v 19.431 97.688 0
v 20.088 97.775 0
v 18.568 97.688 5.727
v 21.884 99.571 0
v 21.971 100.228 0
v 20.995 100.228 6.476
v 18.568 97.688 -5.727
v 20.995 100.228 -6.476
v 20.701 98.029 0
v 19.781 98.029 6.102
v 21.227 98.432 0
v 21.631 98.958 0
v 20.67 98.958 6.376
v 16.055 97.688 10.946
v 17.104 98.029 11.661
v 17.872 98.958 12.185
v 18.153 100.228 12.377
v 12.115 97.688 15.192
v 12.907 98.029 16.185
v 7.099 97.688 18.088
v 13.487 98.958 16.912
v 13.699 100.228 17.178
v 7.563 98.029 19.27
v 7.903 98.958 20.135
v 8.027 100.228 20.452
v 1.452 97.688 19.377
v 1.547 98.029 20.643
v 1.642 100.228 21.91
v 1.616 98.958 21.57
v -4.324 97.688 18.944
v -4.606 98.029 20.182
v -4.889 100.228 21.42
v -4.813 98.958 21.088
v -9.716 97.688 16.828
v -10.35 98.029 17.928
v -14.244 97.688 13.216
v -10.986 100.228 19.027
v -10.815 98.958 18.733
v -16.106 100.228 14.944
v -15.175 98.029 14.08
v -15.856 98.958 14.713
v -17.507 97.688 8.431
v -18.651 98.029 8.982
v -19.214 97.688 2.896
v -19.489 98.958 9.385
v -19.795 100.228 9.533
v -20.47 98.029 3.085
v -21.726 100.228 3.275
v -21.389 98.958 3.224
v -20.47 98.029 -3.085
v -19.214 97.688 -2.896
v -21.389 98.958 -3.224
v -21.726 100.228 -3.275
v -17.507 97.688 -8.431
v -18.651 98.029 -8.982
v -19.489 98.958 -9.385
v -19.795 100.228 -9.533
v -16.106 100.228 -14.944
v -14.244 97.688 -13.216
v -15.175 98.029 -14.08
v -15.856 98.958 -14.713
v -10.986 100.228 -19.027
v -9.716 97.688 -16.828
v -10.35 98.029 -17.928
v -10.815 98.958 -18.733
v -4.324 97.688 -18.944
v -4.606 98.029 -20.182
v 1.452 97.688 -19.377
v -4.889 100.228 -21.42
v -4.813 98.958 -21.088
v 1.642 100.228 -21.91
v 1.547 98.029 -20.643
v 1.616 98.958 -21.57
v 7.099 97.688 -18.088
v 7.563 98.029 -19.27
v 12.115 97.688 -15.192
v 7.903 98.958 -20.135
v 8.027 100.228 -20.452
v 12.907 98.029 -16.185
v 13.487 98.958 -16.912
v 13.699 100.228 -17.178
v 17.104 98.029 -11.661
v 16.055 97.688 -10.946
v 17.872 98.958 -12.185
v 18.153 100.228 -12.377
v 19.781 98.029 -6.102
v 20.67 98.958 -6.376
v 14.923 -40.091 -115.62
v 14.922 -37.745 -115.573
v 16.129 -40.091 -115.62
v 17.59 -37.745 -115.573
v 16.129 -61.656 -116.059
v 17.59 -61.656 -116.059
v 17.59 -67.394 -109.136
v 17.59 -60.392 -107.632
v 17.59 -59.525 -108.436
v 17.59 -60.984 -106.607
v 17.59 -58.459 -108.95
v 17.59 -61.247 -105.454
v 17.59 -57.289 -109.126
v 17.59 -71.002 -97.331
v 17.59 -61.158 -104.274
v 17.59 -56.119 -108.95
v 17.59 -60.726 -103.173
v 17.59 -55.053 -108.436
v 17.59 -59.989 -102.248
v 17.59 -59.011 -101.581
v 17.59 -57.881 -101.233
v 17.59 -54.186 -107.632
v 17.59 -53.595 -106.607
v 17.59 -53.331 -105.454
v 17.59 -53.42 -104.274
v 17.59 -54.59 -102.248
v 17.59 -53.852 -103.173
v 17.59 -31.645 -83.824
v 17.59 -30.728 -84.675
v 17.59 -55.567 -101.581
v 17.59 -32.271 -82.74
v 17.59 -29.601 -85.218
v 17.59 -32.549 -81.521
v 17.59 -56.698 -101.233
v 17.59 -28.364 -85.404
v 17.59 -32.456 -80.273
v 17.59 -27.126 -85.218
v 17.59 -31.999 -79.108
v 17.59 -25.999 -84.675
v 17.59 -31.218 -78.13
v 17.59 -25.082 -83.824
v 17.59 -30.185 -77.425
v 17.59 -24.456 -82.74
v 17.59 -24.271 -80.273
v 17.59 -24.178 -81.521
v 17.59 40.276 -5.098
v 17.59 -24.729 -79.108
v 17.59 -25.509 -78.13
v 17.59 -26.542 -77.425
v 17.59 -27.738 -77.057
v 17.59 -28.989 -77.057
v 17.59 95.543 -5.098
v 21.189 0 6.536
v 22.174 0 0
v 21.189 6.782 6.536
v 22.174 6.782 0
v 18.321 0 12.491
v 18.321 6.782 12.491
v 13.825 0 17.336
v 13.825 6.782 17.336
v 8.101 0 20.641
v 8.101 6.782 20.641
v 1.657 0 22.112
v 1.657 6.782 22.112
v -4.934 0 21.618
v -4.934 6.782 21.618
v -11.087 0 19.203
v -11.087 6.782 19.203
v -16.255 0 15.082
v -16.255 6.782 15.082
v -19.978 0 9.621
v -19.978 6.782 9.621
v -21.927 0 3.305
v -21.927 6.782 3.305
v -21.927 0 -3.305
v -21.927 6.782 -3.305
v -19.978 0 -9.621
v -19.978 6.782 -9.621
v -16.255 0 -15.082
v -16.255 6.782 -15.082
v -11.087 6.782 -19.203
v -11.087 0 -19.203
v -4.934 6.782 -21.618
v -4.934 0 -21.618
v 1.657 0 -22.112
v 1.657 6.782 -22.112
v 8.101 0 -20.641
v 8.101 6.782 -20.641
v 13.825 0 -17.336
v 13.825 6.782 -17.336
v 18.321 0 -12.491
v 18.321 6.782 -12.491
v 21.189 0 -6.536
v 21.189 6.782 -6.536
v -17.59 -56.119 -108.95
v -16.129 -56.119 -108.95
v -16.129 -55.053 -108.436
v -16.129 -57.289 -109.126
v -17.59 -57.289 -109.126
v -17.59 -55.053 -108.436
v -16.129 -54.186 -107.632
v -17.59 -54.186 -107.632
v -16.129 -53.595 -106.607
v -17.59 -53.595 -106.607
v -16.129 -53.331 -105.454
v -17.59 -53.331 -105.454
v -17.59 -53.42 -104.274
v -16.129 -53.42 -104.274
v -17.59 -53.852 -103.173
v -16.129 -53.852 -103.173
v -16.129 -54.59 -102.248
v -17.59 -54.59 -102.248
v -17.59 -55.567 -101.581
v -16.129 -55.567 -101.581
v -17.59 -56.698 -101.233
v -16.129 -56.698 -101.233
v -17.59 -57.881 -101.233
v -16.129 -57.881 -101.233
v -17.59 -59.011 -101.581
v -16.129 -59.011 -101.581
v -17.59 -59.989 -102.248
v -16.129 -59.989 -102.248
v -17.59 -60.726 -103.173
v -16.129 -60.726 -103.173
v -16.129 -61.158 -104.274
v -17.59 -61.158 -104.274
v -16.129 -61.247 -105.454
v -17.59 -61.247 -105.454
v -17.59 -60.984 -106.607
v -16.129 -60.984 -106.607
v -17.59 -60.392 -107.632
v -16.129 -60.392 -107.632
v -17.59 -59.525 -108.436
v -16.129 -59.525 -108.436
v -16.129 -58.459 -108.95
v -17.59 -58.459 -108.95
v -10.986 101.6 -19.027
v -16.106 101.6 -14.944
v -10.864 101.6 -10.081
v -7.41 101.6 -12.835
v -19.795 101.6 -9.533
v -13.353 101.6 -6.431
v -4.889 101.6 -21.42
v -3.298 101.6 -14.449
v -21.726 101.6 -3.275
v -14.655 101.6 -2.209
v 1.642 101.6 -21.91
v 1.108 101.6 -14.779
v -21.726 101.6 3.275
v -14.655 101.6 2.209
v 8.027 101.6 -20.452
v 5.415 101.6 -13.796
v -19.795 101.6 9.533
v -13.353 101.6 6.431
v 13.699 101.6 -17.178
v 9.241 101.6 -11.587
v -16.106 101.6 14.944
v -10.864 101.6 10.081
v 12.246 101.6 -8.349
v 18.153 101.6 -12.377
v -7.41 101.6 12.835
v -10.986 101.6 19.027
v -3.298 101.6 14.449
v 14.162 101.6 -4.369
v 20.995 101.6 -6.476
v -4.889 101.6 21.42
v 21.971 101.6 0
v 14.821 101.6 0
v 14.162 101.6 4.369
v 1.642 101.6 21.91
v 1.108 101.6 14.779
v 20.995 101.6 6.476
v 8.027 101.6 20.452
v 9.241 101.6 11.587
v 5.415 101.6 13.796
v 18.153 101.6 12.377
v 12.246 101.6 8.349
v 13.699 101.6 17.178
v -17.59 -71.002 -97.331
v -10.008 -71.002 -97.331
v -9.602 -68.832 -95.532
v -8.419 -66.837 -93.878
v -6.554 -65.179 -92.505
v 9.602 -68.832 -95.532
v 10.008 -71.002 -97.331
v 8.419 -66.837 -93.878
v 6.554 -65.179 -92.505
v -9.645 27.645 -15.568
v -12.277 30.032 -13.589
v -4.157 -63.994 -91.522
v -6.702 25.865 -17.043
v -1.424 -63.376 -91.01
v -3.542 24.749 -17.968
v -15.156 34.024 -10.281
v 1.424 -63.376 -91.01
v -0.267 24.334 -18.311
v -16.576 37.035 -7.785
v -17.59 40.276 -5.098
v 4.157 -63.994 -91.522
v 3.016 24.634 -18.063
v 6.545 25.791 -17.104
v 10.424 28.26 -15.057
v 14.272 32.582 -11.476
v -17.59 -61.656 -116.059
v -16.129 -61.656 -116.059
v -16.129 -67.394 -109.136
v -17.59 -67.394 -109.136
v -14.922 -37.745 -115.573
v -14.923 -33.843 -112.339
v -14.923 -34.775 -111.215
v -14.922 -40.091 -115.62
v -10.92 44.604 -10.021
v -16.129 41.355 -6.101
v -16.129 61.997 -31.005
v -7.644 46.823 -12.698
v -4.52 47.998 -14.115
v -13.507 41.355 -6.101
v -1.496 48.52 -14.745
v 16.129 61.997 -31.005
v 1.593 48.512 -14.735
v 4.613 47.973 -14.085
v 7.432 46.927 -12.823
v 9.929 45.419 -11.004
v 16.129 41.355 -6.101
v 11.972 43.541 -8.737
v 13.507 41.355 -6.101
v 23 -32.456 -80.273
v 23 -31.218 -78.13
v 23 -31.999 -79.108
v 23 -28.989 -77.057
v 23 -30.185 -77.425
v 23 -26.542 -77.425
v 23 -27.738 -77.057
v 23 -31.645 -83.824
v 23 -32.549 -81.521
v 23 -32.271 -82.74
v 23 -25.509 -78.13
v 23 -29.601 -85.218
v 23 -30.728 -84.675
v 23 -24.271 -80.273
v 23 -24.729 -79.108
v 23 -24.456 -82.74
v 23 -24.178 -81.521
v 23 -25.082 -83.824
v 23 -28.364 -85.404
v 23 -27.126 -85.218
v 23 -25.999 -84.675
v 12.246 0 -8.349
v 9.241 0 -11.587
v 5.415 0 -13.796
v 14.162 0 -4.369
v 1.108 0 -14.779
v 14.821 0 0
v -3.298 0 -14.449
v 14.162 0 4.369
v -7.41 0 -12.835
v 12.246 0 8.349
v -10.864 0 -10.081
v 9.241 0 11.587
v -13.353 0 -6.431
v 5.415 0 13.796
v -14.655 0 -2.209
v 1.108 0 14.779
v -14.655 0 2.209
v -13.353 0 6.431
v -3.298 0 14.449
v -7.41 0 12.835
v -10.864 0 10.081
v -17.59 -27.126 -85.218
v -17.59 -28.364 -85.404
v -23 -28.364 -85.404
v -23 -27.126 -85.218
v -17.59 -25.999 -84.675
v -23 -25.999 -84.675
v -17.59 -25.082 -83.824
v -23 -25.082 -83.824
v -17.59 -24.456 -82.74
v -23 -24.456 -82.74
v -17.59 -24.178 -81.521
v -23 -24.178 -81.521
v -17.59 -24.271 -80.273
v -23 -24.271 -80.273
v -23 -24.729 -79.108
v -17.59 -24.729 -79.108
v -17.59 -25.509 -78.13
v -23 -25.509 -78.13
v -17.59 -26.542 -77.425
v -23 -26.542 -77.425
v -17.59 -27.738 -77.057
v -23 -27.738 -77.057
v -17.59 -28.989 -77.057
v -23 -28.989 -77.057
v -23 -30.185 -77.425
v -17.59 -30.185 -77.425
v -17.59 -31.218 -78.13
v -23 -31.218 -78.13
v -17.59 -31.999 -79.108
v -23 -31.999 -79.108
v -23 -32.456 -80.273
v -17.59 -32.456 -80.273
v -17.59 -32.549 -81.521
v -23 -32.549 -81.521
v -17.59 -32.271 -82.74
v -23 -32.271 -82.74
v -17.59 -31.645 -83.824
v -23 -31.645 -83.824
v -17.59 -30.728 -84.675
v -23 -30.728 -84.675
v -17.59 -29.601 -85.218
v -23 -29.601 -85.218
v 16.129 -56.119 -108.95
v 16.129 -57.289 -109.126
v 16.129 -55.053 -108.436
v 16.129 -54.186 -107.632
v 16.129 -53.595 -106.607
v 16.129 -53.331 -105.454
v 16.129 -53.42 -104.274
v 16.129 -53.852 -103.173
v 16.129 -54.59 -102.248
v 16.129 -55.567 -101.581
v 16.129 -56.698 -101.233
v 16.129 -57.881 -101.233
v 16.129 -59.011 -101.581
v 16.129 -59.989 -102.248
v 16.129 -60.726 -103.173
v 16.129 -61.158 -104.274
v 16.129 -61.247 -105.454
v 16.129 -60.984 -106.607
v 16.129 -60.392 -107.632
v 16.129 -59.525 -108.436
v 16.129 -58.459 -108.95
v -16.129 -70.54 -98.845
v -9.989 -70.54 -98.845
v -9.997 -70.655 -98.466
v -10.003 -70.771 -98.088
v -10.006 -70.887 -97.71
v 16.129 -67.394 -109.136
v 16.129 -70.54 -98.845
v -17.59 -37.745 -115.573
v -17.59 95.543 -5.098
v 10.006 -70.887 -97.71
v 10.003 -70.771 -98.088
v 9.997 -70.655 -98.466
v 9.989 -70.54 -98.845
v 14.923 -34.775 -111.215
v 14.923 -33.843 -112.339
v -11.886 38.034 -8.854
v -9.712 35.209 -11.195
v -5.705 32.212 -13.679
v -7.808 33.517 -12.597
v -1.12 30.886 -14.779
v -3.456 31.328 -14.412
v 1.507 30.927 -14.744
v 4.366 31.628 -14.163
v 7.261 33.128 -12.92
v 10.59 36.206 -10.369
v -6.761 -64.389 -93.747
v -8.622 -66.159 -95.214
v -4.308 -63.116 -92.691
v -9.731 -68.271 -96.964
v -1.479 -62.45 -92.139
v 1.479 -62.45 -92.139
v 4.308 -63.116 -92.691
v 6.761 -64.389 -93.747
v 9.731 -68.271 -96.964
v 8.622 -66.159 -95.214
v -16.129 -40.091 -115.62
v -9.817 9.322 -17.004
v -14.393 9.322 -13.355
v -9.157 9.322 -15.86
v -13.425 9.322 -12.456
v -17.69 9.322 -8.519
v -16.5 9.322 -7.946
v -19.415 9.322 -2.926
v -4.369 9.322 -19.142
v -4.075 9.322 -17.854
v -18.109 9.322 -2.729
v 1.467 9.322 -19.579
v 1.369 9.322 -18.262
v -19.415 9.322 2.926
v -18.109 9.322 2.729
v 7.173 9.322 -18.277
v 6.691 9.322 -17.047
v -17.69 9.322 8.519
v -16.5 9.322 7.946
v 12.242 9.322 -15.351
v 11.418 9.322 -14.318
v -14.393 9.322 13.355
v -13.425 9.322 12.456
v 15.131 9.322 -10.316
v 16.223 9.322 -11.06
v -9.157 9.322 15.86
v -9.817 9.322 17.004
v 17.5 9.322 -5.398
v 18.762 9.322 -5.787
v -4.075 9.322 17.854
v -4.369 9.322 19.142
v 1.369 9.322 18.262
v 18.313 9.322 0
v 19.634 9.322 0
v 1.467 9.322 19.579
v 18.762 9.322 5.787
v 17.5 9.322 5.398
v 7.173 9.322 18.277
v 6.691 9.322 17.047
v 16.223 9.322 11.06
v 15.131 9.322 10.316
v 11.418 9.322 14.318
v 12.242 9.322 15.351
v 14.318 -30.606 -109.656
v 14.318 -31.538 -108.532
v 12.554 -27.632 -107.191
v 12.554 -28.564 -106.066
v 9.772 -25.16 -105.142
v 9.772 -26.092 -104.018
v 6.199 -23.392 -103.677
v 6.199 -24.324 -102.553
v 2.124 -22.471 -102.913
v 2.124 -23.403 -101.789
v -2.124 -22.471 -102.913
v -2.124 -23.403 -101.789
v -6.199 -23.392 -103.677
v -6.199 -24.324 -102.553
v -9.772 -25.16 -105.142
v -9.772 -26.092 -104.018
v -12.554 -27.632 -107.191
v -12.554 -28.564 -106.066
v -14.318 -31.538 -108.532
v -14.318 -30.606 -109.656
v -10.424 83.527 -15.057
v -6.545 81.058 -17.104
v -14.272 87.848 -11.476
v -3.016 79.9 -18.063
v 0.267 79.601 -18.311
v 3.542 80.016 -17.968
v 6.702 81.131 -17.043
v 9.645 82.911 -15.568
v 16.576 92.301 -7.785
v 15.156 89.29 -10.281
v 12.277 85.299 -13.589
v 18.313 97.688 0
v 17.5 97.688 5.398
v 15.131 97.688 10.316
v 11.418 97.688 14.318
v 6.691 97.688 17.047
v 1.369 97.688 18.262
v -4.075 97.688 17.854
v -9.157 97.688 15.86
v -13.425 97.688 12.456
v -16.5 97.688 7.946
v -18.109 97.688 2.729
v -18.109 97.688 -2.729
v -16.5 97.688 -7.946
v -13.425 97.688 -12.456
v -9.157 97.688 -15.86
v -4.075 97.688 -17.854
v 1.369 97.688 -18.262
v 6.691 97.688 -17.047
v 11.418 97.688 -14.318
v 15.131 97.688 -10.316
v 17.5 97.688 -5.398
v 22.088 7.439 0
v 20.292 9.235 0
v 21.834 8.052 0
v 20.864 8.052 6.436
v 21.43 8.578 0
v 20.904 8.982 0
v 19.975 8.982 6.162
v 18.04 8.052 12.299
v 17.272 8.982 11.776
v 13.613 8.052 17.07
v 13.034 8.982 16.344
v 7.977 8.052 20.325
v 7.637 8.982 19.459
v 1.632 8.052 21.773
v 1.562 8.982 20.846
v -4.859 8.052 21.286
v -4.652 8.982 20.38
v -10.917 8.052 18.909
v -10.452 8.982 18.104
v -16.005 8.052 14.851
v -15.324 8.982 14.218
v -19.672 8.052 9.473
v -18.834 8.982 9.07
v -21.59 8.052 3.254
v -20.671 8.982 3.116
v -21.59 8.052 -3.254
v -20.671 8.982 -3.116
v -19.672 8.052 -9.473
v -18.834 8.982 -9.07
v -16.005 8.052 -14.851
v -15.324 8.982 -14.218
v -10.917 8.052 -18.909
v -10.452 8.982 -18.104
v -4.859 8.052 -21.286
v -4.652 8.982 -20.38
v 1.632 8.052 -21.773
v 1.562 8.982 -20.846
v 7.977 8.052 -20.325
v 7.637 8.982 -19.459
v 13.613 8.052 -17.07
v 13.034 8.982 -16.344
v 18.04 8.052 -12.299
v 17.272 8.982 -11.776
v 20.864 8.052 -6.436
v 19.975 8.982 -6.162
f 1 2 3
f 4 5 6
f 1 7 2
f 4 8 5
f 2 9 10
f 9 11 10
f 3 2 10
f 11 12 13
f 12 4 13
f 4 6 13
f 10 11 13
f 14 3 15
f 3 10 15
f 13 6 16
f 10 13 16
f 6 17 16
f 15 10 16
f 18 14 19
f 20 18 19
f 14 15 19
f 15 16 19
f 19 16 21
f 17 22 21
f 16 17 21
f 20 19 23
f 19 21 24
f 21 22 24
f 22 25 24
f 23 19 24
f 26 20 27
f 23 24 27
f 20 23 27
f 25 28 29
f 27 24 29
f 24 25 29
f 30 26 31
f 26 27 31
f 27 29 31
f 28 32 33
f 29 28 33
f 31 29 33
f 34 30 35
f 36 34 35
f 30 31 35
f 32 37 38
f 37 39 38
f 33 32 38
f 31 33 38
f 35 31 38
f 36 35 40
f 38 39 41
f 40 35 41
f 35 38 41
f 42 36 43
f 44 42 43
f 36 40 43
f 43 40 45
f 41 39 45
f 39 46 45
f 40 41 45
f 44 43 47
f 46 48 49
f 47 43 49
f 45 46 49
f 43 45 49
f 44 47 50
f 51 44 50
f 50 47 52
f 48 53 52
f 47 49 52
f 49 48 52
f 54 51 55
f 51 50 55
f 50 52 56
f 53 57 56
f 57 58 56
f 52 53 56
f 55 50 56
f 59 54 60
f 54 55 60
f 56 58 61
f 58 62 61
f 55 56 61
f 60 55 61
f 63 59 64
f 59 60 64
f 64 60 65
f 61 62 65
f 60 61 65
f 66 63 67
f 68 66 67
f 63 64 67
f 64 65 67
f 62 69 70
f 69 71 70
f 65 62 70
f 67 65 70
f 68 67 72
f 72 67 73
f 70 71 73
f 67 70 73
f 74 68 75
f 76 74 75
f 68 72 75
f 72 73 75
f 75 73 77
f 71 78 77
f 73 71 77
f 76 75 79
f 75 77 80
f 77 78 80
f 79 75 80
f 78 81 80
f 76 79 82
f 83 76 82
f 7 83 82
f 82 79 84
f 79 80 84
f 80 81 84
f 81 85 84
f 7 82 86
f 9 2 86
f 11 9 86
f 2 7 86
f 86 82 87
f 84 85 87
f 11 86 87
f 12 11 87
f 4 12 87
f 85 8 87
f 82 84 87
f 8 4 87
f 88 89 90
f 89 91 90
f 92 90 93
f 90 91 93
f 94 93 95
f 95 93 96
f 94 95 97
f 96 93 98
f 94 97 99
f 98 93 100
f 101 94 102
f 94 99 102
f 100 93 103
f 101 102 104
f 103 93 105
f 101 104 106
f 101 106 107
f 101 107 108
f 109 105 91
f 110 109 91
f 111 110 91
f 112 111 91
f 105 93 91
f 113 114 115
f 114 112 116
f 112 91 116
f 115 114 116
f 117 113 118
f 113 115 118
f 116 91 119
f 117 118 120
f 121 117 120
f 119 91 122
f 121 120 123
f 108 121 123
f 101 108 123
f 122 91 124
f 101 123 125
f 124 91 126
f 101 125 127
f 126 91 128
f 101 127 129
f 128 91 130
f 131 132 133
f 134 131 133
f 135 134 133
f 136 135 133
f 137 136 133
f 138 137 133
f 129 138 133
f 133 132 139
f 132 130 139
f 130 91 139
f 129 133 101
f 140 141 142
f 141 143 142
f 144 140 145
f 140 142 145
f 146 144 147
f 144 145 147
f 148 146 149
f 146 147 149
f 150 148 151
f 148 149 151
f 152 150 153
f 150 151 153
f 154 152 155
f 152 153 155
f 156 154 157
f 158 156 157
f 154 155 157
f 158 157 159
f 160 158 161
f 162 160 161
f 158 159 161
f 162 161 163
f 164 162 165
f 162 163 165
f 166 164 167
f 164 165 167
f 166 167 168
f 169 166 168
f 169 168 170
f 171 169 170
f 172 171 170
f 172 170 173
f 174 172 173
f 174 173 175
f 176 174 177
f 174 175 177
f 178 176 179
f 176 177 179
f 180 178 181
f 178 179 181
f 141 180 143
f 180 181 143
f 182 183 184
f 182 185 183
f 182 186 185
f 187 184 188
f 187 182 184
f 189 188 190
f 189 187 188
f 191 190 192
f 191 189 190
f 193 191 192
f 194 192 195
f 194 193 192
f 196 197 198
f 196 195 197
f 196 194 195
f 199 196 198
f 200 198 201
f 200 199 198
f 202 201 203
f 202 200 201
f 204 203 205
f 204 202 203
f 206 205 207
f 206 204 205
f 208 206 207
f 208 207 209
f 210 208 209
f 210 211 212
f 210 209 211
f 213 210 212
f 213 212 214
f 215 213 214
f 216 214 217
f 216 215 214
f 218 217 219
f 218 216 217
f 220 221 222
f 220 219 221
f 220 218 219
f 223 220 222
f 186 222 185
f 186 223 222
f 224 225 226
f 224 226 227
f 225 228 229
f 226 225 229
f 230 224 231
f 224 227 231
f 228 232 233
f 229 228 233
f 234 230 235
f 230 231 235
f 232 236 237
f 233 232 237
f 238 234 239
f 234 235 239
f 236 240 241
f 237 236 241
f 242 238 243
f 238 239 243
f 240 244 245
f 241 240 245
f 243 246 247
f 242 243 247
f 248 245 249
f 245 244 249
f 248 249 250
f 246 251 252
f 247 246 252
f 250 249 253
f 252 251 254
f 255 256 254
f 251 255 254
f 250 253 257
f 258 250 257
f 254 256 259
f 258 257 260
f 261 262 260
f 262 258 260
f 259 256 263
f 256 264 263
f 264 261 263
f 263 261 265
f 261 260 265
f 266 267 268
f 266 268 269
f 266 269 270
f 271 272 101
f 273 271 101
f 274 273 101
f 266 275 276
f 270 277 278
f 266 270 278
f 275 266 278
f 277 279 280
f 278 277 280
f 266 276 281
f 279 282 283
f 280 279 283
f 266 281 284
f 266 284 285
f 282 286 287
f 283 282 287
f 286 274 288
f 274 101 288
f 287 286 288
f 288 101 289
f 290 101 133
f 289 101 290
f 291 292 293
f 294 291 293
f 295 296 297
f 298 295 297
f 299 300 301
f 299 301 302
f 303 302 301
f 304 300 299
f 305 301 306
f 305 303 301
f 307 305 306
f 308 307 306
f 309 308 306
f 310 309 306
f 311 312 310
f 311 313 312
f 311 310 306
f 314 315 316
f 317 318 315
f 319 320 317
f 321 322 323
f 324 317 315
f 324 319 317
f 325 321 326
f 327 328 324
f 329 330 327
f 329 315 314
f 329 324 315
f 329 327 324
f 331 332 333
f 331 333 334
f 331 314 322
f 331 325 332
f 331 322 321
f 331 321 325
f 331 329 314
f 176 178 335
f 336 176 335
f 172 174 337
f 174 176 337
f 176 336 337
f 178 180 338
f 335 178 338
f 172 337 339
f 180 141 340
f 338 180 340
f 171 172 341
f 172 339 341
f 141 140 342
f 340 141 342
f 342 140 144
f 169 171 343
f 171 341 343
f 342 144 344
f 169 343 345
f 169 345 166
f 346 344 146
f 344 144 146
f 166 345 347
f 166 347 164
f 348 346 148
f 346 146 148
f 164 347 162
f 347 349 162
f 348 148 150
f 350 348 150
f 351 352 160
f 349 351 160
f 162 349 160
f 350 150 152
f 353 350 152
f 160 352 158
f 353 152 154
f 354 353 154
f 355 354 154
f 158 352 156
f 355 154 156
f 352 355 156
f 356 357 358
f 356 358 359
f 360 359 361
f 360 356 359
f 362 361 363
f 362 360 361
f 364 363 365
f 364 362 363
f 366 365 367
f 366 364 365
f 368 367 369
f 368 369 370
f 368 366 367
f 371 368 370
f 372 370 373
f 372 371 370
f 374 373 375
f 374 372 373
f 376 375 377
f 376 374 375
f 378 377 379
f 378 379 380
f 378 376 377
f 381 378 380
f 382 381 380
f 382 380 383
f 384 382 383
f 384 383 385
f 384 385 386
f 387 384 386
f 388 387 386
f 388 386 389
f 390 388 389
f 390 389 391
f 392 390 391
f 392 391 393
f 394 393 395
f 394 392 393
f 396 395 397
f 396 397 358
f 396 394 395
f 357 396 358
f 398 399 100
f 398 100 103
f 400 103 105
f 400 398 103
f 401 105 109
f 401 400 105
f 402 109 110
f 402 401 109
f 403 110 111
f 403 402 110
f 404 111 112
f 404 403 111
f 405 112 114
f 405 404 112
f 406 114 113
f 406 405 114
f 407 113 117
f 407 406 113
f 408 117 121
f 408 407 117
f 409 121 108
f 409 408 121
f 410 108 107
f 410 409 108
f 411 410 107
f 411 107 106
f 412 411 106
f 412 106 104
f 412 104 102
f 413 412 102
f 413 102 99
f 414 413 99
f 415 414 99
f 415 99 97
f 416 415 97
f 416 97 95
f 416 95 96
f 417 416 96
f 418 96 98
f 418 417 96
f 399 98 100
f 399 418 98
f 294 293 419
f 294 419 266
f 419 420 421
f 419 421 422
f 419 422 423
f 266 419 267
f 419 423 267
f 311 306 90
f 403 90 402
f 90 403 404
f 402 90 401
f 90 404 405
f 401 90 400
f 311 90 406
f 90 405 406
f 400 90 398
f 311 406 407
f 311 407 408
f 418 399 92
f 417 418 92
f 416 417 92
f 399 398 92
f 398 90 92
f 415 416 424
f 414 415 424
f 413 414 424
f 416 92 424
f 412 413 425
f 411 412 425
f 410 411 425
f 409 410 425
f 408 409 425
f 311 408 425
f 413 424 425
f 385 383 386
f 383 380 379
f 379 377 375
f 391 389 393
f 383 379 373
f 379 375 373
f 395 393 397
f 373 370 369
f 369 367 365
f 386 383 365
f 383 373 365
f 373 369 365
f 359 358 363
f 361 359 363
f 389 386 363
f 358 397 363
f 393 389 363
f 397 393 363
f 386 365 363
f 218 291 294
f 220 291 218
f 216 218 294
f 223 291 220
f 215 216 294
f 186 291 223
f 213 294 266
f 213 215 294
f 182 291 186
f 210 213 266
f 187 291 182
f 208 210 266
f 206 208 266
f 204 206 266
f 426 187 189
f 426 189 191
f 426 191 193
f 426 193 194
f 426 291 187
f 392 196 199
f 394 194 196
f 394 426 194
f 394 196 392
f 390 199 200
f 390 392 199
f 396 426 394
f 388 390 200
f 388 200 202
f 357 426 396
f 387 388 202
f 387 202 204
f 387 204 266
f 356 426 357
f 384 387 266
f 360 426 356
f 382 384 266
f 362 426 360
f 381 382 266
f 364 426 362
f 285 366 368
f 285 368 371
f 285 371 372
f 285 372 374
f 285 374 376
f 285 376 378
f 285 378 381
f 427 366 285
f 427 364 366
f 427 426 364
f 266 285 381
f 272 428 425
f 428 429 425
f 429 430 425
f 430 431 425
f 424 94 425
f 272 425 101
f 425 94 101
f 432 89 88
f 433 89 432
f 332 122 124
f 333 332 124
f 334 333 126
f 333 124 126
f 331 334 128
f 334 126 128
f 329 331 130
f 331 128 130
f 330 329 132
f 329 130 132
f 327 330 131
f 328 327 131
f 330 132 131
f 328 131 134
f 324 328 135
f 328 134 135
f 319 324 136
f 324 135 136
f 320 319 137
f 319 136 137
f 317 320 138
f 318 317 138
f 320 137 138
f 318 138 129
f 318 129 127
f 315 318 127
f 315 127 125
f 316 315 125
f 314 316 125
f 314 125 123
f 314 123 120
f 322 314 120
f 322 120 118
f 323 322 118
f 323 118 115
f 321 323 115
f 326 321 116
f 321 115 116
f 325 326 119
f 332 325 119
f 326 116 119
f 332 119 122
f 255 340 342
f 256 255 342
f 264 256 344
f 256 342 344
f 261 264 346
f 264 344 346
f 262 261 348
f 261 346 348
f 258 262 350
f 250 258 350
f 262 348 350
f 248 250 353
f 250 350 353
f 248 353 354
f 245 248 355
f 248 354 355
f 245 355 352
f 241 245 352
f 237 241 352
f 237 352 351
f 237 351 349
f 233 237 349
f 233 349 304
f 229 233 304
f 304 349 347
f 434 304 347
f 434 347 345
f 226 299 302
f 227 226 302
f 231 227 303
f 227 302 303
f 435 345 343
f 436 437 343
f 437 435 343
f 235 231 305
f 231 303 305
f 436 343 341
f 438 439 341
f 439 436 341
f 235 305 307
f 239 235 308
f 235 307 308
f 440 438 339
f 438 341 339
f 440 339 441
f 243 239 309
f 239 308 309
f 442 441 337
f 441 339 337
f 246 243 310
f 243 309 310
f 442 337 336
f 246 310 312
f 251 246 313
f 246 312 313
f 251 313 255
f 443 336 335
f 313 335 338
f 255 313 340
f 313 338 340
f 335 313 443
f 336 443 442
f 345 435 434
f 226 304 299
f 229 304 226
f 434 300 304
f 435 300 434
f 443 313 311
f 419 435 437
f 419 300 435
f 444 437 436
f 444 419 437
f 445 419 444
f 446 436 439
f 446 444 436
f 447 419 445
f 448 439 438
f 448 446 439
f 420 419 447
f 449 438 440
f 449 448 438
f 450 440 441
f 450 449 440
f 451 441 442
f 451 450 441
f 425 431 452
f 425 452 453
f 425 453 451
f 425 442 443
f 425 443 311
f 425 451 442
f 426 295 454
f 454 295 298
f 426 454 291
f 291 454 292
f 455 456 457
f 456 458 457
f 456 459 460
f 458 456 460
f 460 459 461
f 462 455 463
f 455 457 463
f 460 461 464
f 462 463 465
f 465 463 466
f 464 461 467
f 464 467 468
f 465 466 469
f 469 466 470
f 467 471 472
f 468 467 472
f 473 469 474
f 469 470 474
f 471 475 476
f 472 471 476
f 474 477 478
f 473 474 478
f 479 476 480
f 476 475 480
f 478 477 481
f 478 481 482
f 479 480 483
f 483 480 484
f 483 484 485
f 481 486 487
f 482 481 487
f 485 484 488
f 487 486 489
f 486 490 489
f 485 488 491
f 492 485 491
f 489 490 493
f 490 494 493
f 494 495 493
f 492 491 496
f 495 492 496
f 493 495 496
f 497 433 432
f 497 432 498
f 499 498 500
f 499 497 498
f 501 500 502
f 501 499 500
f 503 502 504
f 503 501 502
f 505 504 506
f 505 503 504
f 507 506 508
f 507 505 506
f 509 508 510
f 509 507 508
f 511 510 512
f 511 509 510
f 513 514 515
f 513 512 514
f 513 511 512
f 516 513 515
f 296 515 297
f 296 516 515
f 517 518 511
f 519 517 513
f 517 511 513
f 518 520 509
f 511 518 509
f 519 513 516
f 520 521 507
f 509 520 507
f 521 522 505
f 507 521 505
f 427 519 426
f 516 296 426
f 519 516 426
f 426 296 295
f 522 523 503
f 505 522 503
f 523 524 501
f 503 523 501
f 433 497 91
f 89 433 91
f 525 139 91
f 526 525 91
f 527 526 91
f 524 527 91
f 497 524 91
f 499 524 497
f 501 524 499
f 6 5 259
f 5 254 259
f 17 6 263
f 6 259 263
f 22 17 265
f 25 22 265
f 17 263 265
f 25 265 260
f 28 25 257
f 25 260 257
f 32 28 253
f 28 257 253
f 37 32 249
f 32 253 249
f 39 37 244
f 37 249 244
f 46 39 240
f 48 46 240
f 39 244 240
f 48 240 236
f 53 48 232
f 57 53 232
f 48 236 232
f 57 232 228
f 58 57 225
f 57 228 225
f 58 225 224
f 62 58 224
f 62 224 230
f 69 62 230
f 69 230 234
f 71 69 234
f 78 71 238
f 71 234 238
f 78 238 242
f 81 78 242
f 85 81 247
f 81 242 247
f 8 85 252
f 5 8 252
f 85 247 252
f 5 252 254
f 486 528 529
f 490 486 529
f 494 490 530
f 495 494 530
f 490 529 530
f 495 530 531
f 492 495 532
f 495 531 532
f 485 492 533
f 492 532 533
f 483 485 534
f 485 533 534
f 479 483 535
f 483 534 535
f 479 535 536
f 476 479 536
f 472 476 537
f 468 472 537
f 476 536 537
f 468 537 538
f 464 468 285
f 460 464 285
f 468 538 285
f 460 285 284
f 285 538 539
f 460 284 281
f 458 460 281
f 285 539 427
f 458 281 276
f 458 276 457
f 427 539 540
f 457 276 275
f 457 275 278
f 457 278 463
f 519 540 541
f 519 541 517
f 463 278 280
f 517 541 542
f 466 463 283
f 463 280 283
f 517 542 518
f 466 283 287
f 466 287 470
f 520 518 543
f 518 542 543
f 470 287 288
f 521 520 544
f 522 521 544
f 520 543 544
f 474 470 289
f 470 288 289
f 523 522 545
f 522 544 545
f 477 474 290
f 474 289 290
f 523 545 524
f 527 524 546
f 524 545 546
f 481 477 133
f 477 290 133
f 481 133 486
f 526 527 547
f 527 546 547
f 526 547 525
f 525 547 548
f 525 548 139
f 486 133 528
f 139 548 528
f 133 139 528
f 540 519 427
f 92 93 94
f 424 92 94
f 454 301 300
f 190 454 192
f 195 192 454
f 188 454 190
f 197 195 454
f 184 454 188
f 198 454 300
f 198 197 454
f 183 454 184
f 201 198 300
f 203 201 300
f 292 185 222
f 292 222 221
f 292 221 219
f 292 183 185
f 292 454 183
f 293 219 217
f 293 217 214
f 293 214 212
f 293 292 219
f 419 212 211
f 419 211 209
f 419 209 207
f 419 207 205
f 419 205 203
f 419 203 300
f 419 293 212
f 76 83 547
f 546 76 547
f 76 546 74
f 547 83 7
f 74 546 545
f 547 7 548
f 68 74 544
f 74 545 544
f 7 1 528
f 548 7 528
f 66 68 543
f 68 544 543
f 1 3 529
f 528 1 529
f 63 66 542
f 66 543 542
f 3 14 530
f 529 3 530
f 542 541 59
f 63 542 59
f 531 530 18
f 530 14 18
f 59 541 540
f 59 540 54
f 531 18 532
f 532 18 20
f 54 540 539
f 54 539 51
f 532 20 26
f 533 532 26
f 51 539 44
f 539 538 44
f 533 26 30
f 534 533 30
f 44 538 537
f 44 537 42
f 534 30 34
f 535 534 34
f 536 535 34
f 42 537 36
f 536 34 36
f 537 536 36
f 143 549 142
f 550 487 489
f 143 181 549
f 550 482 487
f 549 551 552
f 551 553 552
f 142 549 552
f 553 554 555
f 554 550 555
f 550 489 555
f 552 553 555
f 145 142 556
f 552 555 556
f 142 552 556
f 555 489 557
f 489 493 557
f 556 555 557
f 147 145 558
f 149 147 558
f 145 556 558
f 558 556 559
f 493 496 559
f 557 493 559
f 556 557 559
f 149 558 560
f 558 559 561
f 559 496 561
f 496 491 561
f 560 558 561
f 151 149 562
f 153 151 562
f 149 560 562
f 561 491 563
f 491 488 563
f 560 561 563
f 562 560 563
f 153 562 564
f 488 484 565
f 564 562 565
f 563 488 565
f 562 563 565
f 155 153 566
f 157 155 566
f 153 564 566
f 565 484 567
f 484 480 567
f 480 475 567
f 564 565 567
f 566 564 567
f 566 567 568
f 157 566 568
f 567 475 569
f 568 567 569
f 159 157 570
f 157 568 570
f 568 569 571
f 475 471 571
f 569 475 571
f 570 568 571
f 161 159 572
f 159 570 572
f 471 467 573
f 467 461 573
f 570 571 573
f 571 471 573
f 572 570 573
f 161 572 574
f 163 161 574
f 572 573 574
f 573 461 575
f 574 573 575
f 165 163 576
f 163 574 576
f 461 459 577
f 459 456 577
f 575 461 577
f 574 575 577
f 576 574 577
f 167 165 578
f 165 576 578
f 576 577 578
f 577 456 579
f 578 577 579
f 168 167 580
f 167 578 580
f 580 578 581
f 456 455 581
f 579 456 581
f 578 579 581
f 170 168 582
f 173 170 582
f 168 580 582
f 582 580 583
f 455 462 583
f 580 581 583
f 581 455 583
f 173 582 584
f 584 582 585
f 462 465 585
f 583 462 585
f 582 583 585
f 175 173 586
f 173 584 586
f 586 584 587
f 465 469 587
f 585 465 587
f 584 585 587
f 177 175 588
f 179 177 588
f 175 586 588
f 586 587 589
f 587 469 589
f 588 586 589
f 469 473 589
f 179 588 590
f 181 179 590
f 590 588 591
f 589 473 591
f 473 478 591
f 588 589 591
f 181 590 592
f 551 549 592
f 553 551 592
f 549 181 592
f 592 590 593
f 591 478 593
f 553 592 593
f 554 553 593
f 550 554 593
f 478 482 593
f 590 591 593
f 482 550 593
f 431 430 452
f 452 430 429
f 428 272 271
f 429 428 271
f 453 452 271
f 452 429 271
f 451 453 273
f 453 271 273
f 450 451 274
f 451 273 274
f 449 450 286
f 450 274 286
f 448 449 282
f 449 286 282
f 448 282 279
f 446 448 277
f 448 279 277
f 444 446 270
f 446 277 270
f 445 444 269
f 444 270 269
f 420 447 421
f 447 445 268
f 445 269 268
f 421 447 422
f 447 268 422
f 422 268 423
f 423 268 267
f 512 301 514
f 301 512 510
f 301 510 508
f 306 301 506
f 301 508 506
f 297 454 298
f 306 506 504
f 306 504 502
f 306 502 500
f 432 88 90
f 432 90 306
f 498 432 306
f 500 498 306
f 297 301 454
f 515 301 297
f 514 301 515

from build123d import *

# Parameters (mm, degrees)
SKETCH4_R           = 3.96875
BOSS_EXTRUDE1_DEPTH = 17.5895
SKETCH5_W           = 32.258
SKETCH5_H           = 32.3469
CUT_EXTRUDE1_DEPTH  = 149.479
CUT_EXTRUDE2_REACH  = 129.277
CUT_EXTRUDE3_REACH  = 126.564
SKETCH8_R           = 4.19735
BOSS_EXTRUDE2_DEPTH = 5.4102
SKETCH9_R           = 14.8209
CUT_EXTRUDE4_DEPTH  = 102.6


with BuildPart() as part:
    # Sketch3 → Revolve1 (revolve)
    with BuildSketch(Plane.XY):
        with BuildLine():
            Line((0, 0), (22.1742, 0))
            Line((22.1742, 0), (22.1742, 6.7818))
            ThreePointArc((22.1742, 6.7818), (21.430251224, 8.577851224), (19.6342, 9.3218))
            Line((19.6342, 9.3218), (18.3134, 9.3218))
            Line((18.3134, 9.3218), (18.3134, 97.6884))
            Line((18.3134, 97.6884), (19.431, 97.6884))
            ThreePointArc((19.431, 97.6884), (21.227051224, 98.432348776), (21.971, 100.2284))
            Line((21.971, 100.2284), (21.971, 101.6))
            Line((21.971, 101.6), (0, 101.6))
            Line((0, 101.6), (0, 0))
        make_face()
    revolve(axis=Axis((0, 101.6, 0), (0, -1, 0)))

    # Sketch4 → Boss-Extrude1 (add, symmetric)
    with BuildSketch(Plane(origin=(0, 0, 0), x_dir=(0, 0, -1), z_dir=(1, 0, 0))):
        Polygon((3.319704812, 97.6884), (115.572791881, -37.744541555), (116.058945734, -61.655625383), (109.136154682, -67.393554854), (97.331039415, -71.002358659), (0, 46.427186637), align=None)
        with Locations((105.157137902, -57.289139694)):
            Circle(SKETCH4_R, mode=Mode.SUBTRACT)
    extrude(amount=BOSS_EXTRUDE1_DEPTH, both=True)

    # Sketch5 → Cut-Extrude1 (cut)
    with BuildSketch(Plane(origin=(0, -93.569618845, -77.554828616), x_dir=(1, 0, 0), z_dir=(0, -0.769917596, -0.638143319))):
        with Locations((0, -47.261148993)):
            Rectangle(SKETCH5_W, SKETCH5_H)
    extrude(amount=-CUT_EXTRUDE1_DEPTH, mode=Mode.SUBTRACT)

    # Sketch6 → Cut-Extrude2 (cut, up to next)
    with BuildSketch(Plane(origin=(0, 41.412373886, -49.963878576), x_dir=(-1, 0, 0), z_dir=(0, 0.638143319, -0.769917596)), mode=Mode.PRIVATE) as cut_extrude2_sk1:
        with BuildLine():
            Line((14.9225, -97.744891724), (14.9225, -112.907394914))
            Line((14.9225, -112.907394914), (-14.9225, -112.907394914))
            Line((-14.9225, -112.907394914), (-14.9225, -97.744891724))
            ThreePointArc((-14.9225, -97.744891724), (0, -82.822391724), (14.9225, -97.744891724))
        make_face()
    cut_extrude2_tool1 = extrude(cut_extrude2_sk1.sketch, amount=-CUT_EXTRUDE2_REACH, mode=Mode.PRIVATE) & part.part
    add(cut_extrude2_tool1.solids().sort_by_distance((0, -35.009466, -113.305835))[0], mode=Mode.SUBTRACT)

    # Sketch7 → Cut-Extrude3 (cut, up to next)
    with BuildSketch(Plane(origin=(0, 18.906399111, -22.81050181), x_dir=(1, 0, 0), z_dir=(0, -0.638143319, 0.769917596)), mode=Mode.PRIVATE) as cut_extrude3_sk1:
        with BuildLine():
            Line((-9.989016296, -117.386717047), (9.989016296, -117.386717047))
            ThreePointArc((9.989016296, -117.386717047), (0, -106.76951783), (-9.989016296, -117.386717047))
        make_face()
    cut_extrude3_tool1 = extrude(cut_extrude3_sk1.sketch, amount=-CUT_EXTRUDE3_REACH, mode=Mode.PRIVATE) & part.part
    add(cut_extrude3_tool1.solids().sort_by_distance((0, -67.984352, -94.829576))[0], mode=Mode.SUBTRACT)

    # Sketch8 → Boss-Extrude2 (add)
    with BuildSketch(Plane(origin=(17.5895, 0, 0), x_dir=(0, 0, -1), z_dir=(1, 0, 0))):
        with Locations((81.207034429, -28.363574673)):
            Circle(SKETCH8_R)
    boss_extrude2 = extrude(amount=BOSS_EXTRUDE2_DEPTH)

    # Mirror1: Boss-Extrude2 across plane
    add(boss_extrude2.mirror(Plane(origin=(0, 0, 0), x_dir=(0, 0, 1), z_dir=(1, 0, 0))))

    # Sketch9 → Cut-Extrude4 (cut, through all)
    with BuildSketch(Plane.XZ):
        Circle(SKETCH9_R)
    extrude(amount=-CUT_EXTRUDE4_DEPTH, mode=Mode.SUBTRACT)


solid = part.part
